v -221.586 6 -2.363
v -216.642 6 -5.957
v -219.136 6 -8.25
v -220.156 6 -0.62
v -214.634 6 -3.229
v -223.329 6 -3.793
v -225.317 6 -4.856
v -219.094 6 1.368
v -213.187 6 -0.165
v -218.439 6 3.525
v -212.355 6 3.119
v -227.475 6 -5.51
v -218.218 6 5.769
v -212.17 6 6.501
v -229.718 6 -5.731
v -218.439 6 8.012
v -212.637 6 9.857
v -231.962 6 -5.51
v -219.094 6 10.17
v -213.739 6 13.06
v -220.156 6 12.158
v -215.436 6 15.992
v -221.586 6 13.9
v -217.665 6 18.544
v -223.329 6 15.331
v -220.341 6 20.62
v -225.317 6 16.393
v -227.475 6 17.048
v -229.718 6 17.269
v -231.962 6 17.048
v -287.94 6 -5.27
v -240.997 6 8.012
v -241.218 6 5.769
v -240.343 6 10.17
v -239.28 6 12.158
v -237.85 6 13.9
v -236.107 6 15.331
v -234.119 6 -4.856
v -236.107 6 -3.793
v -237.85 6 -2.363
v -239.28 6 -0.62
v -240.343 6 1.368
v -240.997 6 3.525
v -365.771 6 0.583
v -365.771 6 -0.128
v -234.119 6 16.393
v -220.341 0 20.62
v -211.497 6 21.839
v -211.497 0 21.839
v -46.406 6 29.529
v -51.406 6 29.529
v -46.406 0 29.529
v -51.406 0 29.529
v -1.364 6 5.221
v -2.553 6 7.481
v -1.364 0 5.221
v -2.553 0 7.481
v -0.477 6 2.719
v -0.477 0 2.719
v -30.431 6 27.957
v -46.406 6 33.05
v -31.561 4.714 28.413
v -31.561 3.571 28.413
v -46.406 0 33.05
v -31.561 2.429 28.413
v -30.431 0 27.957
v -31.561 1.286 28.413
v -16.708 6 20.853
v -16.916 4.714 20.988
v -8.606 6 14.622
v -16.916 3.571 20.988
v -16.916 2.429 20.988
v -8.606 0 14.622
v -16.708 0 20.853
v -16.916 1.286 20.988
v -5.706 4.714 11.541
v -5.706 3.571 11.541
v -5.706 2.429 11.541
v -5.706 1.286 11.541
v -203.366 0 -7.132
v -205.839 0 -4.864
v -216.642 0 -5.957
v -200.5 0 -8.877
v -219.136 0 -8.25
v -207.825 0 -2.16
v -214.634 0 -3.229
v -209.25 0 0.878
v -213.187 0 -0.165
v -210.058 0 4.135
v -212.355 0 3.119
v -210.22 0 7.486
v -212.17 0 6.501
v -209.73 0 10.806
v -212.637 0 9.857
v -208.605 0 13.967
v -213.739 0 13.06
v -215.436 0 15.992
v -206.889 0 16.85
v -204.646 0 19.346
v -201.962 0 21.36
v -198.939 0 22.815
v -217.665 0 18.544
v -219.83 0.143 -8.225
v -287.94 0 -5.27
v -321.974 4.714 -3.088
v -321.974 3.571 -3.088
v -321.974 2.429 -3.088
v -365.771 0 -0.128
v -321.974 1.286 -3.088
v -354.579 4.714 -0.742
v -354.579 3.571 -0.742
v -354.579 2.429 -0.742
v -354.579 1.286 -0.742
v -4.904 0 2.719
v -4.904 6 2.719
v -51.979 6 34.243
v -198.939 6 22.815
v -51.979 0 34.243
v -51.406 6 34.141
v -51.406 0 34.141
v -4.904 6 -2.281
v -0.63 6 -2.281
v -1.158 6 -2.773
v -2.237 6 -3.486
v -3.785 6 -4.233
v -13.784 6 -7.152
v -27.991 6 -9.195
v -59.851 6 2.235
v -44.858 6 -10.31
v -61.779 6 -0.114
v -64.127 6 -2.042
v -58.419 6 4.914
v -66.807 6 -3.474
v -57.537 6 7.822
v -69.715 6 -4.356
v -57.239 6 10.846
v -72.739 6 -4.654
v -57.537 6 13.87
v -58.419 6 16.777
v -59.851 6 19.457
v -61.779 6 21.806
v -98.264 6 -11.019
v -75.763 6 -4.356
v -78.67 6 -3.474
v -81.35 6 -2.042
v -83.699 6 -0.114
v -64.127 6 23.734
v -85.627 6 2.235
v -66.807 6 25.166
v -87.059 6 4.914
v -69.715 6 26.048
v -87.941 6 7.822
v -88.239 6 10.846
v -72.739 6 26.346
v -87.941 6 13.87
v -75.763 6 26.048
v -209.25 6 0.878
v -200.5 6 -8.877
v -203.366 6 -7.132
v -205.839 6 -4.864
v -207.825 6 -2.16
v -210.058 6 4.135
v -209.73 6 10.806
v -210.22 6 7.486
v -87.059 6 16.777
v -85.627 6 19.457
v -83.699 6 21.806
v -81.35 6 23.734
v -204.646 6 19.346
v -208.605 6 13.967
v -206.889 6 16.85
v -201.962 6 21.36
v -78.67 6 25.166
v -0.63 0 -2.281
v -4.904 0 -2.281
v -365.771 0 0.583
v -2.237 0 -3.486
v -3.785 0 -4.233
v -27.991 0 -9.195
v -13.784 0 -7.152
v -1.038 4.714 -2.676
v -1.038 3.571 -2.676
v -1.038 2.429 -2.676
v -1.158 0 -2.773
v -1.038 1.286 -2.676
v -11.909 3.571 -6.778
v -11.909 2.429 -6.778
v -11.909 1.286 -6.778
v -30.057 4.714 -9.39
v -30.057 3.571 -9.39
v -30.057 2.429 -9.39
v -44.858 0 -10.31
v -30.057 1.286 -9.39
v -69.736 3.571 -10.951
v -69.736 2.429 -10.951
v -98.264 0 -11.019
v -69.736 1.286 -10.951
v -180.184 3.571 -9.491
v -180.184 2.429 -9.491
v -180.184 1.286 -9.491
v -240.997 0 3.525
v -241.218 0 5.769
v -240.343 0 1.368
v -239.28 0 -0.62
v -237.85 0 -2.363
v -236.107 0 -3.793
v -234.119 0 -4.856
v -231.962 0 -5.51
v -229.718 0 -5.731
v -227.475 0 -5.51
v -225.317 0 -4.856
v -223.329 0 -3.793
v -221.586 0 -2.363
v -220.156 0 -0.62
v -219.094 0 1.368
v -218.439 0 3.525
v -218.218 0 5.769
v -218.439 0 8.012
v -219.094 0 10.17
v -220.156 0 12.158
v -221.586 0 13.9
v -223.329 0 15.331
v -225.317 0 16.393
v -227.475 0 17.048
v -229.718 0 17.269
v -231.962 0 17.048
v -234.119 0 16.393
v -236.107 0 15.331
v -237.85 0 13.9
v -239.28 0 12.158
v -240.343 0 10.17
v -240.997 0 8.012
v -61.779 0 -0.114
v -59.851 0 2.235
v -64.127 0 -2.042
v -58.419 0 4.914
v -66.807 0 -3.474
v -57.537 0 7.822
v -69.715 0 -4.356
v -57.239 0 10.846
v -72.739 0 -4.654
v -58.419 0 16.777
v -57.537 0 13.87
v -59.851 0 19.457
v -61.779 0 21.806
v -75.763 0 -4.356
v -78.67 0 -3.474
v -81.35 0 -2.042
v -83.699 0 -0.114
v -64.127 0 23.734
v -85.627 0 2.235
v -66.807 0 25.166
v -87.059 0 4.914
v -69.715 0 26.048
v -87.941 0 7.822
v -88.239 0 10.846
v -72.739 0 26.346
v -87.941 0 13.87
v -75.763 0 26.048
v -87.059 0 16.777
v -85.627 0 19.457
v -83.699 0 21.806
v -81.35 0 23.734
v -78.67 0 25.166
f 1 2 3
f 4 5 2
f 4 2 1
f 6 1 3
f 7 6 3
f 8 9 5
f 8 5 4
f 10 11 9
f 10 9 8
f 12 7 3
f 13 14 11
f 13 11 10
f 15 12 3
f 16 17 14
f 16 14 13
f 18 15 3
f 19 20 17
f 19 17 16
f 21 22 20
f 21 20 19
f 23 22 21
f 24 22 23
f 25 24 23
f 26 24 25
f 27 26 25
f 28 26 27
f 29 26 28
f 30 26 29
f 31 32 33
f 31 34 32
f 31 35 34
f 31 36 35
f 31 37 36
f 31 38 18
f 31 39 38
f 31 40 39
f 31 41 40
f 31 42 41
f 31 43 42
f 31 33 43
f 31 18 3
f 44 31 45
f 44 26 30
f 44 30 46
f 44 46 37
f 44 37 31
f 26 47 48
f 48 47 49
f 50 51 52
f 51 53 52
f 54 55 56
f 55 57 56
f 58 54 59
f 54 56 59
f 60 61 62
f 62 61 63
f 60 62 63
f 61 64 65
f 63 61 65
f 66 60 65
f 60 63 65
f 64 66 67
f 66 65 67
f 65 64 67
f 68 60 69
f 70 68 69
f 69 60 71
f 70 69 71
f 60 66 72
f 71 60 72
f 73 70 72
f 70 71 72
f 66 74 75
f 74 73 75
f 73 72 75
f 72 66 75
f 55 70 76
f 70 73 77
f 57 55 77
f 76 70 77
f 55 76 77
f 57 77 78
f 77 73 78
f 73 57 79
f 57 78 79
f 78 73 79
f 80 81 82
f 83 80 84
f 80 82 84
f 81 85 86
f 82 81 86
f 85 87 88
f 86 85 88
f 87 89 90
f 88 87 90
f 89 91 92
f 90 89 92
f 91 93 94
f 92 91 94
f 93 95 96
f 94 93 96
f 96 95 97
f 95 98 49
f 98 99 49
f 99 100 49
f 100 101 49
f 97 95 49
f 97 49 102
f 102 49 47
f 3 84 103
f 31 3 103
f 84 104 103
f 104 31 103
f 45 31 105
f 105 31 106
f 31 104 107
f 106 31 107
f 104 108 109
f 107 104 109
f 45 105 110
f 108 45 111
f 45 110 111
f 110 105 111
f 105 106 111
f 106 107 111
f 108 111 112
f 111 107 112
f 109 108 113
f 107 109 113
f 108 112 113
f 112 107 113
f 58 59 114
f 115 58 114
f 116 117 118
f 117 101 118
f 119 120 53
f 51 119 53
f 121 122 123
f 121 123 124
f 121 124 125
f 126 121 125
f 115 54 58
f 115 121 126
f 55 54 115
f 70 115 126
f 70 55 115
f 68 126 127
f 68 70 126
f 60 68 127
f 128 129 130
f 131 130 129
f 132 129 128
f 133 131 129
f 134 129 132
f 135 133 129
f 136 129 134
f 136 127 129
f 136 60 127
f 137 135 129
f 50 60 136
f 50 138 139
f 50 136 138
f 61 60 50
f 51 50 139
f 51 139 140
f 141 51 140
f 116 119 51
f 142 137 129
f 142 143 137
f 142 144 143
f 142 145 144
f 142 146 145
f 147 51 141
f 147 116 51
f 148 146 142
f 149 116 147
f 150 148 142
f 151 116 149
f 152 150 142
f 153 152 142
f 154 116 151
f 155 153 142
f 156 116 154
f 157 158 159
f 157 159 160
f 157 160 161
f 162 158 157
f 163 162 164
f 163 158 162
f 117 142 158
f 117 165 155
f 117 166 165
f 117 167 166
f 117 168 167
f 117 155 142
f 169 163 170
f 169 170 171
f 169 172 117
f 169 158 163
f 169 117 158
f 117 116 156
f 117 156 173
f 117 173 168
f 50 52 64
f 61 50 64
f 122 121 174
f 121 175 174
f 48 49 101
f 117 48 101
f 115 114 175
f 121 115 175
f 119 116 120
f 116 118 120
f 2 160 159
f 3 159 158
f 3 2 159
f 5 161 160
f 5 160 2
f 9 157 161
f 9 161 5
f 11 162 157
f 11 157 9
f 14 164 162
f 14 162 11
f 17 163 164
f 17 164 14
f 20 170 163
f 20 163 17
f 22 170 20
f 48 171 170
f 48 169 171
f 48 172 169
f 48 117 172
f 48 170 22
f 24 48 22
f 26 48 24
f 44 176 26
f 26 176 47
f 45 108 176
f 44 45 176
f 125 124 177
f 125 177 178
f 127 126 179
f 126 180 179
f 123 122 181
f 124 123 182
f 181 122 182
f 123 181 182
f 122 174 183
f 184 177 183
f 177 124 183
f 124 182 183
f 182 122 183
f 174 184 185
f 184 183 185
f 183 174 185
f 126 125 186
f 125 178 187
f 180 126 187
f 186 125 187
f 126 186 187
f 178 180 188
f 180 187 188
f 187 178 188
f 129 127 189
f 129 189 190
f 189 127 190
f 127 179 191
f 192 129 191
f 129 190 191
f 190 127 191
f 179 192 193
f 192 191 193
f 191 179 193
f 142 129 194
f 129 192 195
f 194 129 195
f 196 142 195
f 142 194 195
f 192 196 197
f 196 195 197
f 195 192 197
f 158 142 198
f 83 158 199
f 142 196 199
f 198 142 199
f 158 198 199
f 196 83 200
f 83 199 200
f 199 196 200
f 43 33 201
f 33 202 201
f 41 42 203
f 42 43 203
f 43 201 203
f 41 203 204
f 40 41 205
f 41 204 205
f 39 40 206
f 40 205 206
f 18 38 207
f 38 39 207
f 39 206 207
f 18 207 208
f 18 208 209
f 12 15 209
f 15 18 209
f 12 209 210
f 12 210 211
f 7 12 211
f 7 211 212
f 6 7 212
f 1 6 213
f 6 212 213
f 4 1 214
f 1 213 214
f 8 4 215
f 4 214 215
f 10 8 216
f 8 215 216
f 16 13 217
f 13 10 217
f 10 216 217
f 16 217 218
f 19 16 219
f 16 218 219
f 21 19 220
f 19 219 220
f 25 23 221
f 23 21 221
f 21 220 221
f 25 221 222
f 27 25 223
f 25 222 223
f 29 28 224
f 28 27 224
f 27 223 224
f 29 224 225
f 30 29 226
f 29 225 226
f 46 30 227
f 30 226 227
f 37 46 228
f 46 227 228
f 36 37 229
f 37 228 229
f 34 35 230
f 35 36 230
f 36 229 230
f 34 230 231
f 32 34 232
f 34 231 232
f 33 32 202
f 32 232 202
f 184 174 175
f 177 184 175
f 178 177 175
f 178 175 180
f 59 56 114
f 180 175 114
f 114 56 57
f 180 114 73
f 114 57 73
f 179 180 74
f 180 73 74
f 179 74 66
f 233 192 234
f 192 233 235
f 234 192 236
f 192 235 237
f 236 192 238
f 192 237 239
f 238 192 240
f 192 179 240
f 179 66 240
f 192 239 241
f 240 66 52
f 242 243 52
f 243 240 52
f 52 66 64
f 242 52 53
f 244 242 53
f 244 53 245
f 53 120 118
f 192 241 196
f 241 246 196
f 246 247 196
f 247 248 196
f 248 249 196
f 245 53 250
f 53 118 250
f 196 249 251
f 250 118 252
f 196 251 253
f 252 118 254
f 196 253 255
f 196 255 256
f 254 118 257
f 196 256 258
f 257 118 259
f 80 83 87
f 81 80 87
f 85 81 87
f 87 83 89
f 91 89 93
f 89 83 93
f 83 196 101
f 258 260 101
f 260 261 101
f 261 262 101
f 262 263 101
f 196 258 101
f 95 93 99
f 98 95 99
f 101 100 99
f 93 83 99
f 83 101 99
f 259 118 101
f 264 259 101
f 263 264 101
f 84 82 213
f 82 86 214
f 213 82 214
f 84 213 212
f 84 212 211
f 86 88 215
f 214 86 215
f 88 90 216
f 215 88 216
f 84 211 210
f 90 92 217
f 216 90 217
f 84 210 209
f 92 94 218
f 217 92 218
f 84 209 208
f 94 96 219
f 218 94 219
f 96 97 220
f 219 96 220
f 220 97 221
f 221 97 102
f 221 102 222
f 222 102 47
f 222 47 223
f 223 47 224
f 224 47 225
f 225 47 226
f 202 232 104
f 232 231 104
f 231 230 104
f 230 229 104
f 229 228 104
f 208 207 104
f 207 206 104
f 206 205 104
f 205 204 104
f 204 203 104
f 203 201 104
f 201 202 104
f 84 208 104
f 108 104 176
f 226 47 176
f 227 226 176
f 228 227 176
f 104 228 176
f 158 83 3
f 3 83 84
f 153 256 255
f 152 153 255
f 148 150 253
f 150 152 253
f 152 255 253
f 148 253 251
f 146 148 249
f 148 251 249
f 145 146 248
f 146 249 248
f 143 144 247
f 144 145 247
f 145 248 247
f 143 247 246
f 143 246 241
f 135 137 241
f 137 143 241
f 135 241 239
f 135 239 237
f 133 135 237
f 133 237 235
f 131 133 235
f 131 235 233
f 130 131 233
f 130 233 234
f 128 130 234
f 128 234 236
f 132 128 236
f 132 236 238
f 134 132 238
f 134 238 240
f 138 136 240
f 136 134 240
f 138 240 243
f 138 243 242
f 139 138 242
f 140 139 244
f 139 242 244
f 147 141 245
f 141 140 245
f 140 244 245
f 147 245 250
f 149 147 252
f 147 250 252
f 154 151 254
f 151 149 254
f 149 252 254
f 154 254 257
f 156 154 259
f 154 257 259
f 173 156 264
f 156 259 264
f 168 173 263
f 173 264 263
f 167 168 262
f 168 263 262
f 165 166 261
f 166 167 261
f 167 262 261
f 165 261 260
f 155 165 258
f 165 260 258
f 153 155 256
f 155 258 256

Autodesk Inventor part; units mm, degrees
ref_plane "YZ Plane" through (0, 0, 0) normal (1, 0, 0) x (0, 1, 0)
ref_plane "XZ Plane" through (0, 0, 0) normal (0, 1, 0) x (-1, 0, 0)
ref_plane "XY Plane" through (0, 0, 0) normal (0, 0, 1) x (1, 0, 0)
sketch "Sketch1" plane through (0, 0, 0) normal (0, 1, 0) x (-1, 0, 0)
  spline S0 degree 4 poles (51.979, 34.2431) (49.1051, 33.7566) (39.5332, 31.5872) (30.1137, 28.1904) (19.6059, 22.8943) (13.0923, 18.5073) (7.8605, 14.3051) (3.9363, 9.4088) (1.5106, 6.3896) (0.0434, 1.3996) (-0.032, 0.3871) (0.028, -0.8915) (0.1768, -1.4854) (0.3983, -2.0441) (0.8215, -2.5037) (1.3408, -2.946) (2.6667, -3.7655) (3.7155, -4.2634) (10.6098, -6.747) (15.9249, -7.4764) (25.5133, -9.1262) (35.8155, -9.8616) (48.4495, -10.5455) (62.4279, -10.8762) (77.9663, -11.0677) (94.722, -11.0635) (112.5613, -10.9225) (131.2432, -10.6462) (150.5553, -10.2615) (170.2642, -9.7779) (190.1377, -9.2151) (209.9398, -8.5807) (229.4366, -7.8911) (248.3971, -7.1484) (266.6047, -6.3637) (283.8414, -5.5226) (299.9482, -4.5961) (314.7433, -3.6129) (328.1612, -2.6484) (339.8268, -1.769) (350.012, -1.0496) (357.5866, -0.5225) (364.806, -0.1794) (367.4848, -0.031) (370.1657, -0.0078) (369.9872, 0.0018) knots 0 0 0 0 0 0.056172 0.079777 0.102171 0.123272 0.142974 0.16113 0.176202 0.188392 0.197687 0.204488 0.210696 0.216571 0.223012 0.230232 0.240513 0.254518 0.272366 0.294434 0.318911 0.345468 0.373865 0.403873 0.435249 0.467749 0.501146 0.535218 0.569752 0.604537 0.639365 0.674029 0.708317 0.742021 0.774934 0.806859 0.837599 0.866942 0.894636 0.920358 0.943684 0.964014 0.980302 1 1 1 1 1
  circle A0 centre (370, 0) radius 160 construction
  line L0 (370, 0) -> (211.4974, 21.8387)
  circle A1 centre (211.4974, 21.8387) radius 160 construction
  line L1 (211.4974, 21.8387) -> (51.979, 34.2431)
  line L2 (-0.096, 2.719) -> (4.904, 2.719)
  line L3 (4.904, 2.719) -> (4.904, -2.281)
  line L4 (4.904, -2.281) -> (-0.096, -2.281)
  line L5 (-0.096, -2.281) -> (-0.096, 2.719)
  circle A2 centre (369.9872, 0.0018) radius 3 construction
  line L6 (365.7713, 2.7478) -> (370.7713, 2.7478)
  line L7 (370.7713, 2.7478) -> (370.7713, -2.2522)
  line L8 (370.7713, -2.2522) -> (365.7713, -2.2522)
  line L9 (365.7713, -2.2522) -> (365.7713, 2.7478)
  line L10 (211.4974, 21.8387) -> (210.0997, -8.5616) construction
  arc A3 (200.5005, -8.8773) -> (198.939, 22.8152) centre (193.0135, 6.6385) ccw
  arc A4 (220.3414, 20.6201) -> (219.1363, -8.2496) centre (229.7182, 5.7687) ccw
  line L11 (46.4065, 34.5291) -> (51.4065, 34.5291)
  line L12 (51.4065, 34.5291) -> (51.4065, 29.5291)
  line L13 (51.4065, 29.5291) -> (46.4065, 29.5291)
  line L14 (46.4065, 29.5291) -> (46.4065, 34.5291)
  line L15 (46.4065, 34.5291) -> (51.4065, 29.5291) construction
  line L16 (51.4065, 34.5291) -> (46.4065, 29.5291) construction
  circle A5 centre (229.7182, 5.7687) radius 11.5
  circle A6 centre (229.7182, 5.7687) radius 4
  circle A7 centre (72.7388, 10.8459) radius 15.5
  point P0 (0, 0)
  point P1 (370, 0)
  point P2 (35.937, 30.0257)
  point P3 (27.0238, 26.4761)
  point P4 (19.2974, 22.4624)
  point P5 (12.8156, 18.139)
  point P6 (7.6237, 13.6489)
  point P7 (3.7499, 9.1521)
  point P8 (1.2115, 4.8535)
  point P9 (0.0668, 1.0195)
  point P10 (0.0003, -0.0638)
  point P11 (0.0755, -0.9849)
  point P12 (0.2106, -1.5356)
  point P13 (0.4302, -2.0122)
  point P14 (0.7739, -2.4345)
  point P15 (1.2488, -2.8423)
  point P16 (2.1566, -3.4383)
  point P17 (3.2773, -4.0196)
  point P18 (8.2772, -5.8071)
  point P19 (15.3669, -7.4261)
  point P20 (24.3167, -8.7706)
  point P21 (35.0526, -9.7678)
  point P22 (47.5438, -10.4262)
  point P23 (61.6814, -10.8267)
  point P24 (77.2847, -11.0213)
  point P25 (94.162, -11.0379)
  point P26 (112.1091, -10.9014)
  point P27 (130.911, -10.6315)
  point P28 (150.3435, -10.2474)
  point P29 (170.176, -9.7646)
  point P30 (190.1737, -9.1986)
  point P31 (229.7182, -7.8653)
  point P32 (248.7963, -7.1166)
  point P33 (267.1071, -6.3194)
  point P34 (284.4371, -5.4606)
  point P35 (300.619, -4.5258)
  point P36 (315.5184, -3.5432)
  point P37 (328.988, -2.5786)
  point P38 (340.8625, -1.7041)
  point P39 (350.9622, -0.9861)
  point P40 (359.0984, -0.4682)
  point P41 (365.0855, -0.1602)
  point P42 (368.7597, -0.0285)
  point P43 (370, 0)
  point P44 (0.4773, 2.719)
  point P45 (0.6305, -2.281)
  point P46 (365.7713, -0.1283)
  point P47 (368.4073, 0.2194)
  point P48 (48.9065, 32.0291)
  point P49 (112.1091, -11.9485)
  point P50 (365.7713, 0.5826)
  point P51 (51.4065, 34.1414)
  point P52 (46.4065, 33.0501)
  dimension "d5" = 160
  dimension "d8" = 160
  dimension "d17" = 5
  dimension "d18" = 5
  dimension "d25" = 6
  dimension "d26" = 5
  dimension "d27" = 5
  dimension "d36" = 5
  dimension "d37" = 5
  dimension "d41" = 23
  dimension "d50" = 368.7594
  dimension "d60" = 8
  dimension "d62" = 31
extrude "Extrusion4" add sketch "Sketch1" along normal blind 6 contours A3 L1 L0 A4 S0 | S0 L4 L3 L2 L14 L13 L12 L1 A3 | A4 L0 L9 S0
properties part number "airfoil blueprint"
